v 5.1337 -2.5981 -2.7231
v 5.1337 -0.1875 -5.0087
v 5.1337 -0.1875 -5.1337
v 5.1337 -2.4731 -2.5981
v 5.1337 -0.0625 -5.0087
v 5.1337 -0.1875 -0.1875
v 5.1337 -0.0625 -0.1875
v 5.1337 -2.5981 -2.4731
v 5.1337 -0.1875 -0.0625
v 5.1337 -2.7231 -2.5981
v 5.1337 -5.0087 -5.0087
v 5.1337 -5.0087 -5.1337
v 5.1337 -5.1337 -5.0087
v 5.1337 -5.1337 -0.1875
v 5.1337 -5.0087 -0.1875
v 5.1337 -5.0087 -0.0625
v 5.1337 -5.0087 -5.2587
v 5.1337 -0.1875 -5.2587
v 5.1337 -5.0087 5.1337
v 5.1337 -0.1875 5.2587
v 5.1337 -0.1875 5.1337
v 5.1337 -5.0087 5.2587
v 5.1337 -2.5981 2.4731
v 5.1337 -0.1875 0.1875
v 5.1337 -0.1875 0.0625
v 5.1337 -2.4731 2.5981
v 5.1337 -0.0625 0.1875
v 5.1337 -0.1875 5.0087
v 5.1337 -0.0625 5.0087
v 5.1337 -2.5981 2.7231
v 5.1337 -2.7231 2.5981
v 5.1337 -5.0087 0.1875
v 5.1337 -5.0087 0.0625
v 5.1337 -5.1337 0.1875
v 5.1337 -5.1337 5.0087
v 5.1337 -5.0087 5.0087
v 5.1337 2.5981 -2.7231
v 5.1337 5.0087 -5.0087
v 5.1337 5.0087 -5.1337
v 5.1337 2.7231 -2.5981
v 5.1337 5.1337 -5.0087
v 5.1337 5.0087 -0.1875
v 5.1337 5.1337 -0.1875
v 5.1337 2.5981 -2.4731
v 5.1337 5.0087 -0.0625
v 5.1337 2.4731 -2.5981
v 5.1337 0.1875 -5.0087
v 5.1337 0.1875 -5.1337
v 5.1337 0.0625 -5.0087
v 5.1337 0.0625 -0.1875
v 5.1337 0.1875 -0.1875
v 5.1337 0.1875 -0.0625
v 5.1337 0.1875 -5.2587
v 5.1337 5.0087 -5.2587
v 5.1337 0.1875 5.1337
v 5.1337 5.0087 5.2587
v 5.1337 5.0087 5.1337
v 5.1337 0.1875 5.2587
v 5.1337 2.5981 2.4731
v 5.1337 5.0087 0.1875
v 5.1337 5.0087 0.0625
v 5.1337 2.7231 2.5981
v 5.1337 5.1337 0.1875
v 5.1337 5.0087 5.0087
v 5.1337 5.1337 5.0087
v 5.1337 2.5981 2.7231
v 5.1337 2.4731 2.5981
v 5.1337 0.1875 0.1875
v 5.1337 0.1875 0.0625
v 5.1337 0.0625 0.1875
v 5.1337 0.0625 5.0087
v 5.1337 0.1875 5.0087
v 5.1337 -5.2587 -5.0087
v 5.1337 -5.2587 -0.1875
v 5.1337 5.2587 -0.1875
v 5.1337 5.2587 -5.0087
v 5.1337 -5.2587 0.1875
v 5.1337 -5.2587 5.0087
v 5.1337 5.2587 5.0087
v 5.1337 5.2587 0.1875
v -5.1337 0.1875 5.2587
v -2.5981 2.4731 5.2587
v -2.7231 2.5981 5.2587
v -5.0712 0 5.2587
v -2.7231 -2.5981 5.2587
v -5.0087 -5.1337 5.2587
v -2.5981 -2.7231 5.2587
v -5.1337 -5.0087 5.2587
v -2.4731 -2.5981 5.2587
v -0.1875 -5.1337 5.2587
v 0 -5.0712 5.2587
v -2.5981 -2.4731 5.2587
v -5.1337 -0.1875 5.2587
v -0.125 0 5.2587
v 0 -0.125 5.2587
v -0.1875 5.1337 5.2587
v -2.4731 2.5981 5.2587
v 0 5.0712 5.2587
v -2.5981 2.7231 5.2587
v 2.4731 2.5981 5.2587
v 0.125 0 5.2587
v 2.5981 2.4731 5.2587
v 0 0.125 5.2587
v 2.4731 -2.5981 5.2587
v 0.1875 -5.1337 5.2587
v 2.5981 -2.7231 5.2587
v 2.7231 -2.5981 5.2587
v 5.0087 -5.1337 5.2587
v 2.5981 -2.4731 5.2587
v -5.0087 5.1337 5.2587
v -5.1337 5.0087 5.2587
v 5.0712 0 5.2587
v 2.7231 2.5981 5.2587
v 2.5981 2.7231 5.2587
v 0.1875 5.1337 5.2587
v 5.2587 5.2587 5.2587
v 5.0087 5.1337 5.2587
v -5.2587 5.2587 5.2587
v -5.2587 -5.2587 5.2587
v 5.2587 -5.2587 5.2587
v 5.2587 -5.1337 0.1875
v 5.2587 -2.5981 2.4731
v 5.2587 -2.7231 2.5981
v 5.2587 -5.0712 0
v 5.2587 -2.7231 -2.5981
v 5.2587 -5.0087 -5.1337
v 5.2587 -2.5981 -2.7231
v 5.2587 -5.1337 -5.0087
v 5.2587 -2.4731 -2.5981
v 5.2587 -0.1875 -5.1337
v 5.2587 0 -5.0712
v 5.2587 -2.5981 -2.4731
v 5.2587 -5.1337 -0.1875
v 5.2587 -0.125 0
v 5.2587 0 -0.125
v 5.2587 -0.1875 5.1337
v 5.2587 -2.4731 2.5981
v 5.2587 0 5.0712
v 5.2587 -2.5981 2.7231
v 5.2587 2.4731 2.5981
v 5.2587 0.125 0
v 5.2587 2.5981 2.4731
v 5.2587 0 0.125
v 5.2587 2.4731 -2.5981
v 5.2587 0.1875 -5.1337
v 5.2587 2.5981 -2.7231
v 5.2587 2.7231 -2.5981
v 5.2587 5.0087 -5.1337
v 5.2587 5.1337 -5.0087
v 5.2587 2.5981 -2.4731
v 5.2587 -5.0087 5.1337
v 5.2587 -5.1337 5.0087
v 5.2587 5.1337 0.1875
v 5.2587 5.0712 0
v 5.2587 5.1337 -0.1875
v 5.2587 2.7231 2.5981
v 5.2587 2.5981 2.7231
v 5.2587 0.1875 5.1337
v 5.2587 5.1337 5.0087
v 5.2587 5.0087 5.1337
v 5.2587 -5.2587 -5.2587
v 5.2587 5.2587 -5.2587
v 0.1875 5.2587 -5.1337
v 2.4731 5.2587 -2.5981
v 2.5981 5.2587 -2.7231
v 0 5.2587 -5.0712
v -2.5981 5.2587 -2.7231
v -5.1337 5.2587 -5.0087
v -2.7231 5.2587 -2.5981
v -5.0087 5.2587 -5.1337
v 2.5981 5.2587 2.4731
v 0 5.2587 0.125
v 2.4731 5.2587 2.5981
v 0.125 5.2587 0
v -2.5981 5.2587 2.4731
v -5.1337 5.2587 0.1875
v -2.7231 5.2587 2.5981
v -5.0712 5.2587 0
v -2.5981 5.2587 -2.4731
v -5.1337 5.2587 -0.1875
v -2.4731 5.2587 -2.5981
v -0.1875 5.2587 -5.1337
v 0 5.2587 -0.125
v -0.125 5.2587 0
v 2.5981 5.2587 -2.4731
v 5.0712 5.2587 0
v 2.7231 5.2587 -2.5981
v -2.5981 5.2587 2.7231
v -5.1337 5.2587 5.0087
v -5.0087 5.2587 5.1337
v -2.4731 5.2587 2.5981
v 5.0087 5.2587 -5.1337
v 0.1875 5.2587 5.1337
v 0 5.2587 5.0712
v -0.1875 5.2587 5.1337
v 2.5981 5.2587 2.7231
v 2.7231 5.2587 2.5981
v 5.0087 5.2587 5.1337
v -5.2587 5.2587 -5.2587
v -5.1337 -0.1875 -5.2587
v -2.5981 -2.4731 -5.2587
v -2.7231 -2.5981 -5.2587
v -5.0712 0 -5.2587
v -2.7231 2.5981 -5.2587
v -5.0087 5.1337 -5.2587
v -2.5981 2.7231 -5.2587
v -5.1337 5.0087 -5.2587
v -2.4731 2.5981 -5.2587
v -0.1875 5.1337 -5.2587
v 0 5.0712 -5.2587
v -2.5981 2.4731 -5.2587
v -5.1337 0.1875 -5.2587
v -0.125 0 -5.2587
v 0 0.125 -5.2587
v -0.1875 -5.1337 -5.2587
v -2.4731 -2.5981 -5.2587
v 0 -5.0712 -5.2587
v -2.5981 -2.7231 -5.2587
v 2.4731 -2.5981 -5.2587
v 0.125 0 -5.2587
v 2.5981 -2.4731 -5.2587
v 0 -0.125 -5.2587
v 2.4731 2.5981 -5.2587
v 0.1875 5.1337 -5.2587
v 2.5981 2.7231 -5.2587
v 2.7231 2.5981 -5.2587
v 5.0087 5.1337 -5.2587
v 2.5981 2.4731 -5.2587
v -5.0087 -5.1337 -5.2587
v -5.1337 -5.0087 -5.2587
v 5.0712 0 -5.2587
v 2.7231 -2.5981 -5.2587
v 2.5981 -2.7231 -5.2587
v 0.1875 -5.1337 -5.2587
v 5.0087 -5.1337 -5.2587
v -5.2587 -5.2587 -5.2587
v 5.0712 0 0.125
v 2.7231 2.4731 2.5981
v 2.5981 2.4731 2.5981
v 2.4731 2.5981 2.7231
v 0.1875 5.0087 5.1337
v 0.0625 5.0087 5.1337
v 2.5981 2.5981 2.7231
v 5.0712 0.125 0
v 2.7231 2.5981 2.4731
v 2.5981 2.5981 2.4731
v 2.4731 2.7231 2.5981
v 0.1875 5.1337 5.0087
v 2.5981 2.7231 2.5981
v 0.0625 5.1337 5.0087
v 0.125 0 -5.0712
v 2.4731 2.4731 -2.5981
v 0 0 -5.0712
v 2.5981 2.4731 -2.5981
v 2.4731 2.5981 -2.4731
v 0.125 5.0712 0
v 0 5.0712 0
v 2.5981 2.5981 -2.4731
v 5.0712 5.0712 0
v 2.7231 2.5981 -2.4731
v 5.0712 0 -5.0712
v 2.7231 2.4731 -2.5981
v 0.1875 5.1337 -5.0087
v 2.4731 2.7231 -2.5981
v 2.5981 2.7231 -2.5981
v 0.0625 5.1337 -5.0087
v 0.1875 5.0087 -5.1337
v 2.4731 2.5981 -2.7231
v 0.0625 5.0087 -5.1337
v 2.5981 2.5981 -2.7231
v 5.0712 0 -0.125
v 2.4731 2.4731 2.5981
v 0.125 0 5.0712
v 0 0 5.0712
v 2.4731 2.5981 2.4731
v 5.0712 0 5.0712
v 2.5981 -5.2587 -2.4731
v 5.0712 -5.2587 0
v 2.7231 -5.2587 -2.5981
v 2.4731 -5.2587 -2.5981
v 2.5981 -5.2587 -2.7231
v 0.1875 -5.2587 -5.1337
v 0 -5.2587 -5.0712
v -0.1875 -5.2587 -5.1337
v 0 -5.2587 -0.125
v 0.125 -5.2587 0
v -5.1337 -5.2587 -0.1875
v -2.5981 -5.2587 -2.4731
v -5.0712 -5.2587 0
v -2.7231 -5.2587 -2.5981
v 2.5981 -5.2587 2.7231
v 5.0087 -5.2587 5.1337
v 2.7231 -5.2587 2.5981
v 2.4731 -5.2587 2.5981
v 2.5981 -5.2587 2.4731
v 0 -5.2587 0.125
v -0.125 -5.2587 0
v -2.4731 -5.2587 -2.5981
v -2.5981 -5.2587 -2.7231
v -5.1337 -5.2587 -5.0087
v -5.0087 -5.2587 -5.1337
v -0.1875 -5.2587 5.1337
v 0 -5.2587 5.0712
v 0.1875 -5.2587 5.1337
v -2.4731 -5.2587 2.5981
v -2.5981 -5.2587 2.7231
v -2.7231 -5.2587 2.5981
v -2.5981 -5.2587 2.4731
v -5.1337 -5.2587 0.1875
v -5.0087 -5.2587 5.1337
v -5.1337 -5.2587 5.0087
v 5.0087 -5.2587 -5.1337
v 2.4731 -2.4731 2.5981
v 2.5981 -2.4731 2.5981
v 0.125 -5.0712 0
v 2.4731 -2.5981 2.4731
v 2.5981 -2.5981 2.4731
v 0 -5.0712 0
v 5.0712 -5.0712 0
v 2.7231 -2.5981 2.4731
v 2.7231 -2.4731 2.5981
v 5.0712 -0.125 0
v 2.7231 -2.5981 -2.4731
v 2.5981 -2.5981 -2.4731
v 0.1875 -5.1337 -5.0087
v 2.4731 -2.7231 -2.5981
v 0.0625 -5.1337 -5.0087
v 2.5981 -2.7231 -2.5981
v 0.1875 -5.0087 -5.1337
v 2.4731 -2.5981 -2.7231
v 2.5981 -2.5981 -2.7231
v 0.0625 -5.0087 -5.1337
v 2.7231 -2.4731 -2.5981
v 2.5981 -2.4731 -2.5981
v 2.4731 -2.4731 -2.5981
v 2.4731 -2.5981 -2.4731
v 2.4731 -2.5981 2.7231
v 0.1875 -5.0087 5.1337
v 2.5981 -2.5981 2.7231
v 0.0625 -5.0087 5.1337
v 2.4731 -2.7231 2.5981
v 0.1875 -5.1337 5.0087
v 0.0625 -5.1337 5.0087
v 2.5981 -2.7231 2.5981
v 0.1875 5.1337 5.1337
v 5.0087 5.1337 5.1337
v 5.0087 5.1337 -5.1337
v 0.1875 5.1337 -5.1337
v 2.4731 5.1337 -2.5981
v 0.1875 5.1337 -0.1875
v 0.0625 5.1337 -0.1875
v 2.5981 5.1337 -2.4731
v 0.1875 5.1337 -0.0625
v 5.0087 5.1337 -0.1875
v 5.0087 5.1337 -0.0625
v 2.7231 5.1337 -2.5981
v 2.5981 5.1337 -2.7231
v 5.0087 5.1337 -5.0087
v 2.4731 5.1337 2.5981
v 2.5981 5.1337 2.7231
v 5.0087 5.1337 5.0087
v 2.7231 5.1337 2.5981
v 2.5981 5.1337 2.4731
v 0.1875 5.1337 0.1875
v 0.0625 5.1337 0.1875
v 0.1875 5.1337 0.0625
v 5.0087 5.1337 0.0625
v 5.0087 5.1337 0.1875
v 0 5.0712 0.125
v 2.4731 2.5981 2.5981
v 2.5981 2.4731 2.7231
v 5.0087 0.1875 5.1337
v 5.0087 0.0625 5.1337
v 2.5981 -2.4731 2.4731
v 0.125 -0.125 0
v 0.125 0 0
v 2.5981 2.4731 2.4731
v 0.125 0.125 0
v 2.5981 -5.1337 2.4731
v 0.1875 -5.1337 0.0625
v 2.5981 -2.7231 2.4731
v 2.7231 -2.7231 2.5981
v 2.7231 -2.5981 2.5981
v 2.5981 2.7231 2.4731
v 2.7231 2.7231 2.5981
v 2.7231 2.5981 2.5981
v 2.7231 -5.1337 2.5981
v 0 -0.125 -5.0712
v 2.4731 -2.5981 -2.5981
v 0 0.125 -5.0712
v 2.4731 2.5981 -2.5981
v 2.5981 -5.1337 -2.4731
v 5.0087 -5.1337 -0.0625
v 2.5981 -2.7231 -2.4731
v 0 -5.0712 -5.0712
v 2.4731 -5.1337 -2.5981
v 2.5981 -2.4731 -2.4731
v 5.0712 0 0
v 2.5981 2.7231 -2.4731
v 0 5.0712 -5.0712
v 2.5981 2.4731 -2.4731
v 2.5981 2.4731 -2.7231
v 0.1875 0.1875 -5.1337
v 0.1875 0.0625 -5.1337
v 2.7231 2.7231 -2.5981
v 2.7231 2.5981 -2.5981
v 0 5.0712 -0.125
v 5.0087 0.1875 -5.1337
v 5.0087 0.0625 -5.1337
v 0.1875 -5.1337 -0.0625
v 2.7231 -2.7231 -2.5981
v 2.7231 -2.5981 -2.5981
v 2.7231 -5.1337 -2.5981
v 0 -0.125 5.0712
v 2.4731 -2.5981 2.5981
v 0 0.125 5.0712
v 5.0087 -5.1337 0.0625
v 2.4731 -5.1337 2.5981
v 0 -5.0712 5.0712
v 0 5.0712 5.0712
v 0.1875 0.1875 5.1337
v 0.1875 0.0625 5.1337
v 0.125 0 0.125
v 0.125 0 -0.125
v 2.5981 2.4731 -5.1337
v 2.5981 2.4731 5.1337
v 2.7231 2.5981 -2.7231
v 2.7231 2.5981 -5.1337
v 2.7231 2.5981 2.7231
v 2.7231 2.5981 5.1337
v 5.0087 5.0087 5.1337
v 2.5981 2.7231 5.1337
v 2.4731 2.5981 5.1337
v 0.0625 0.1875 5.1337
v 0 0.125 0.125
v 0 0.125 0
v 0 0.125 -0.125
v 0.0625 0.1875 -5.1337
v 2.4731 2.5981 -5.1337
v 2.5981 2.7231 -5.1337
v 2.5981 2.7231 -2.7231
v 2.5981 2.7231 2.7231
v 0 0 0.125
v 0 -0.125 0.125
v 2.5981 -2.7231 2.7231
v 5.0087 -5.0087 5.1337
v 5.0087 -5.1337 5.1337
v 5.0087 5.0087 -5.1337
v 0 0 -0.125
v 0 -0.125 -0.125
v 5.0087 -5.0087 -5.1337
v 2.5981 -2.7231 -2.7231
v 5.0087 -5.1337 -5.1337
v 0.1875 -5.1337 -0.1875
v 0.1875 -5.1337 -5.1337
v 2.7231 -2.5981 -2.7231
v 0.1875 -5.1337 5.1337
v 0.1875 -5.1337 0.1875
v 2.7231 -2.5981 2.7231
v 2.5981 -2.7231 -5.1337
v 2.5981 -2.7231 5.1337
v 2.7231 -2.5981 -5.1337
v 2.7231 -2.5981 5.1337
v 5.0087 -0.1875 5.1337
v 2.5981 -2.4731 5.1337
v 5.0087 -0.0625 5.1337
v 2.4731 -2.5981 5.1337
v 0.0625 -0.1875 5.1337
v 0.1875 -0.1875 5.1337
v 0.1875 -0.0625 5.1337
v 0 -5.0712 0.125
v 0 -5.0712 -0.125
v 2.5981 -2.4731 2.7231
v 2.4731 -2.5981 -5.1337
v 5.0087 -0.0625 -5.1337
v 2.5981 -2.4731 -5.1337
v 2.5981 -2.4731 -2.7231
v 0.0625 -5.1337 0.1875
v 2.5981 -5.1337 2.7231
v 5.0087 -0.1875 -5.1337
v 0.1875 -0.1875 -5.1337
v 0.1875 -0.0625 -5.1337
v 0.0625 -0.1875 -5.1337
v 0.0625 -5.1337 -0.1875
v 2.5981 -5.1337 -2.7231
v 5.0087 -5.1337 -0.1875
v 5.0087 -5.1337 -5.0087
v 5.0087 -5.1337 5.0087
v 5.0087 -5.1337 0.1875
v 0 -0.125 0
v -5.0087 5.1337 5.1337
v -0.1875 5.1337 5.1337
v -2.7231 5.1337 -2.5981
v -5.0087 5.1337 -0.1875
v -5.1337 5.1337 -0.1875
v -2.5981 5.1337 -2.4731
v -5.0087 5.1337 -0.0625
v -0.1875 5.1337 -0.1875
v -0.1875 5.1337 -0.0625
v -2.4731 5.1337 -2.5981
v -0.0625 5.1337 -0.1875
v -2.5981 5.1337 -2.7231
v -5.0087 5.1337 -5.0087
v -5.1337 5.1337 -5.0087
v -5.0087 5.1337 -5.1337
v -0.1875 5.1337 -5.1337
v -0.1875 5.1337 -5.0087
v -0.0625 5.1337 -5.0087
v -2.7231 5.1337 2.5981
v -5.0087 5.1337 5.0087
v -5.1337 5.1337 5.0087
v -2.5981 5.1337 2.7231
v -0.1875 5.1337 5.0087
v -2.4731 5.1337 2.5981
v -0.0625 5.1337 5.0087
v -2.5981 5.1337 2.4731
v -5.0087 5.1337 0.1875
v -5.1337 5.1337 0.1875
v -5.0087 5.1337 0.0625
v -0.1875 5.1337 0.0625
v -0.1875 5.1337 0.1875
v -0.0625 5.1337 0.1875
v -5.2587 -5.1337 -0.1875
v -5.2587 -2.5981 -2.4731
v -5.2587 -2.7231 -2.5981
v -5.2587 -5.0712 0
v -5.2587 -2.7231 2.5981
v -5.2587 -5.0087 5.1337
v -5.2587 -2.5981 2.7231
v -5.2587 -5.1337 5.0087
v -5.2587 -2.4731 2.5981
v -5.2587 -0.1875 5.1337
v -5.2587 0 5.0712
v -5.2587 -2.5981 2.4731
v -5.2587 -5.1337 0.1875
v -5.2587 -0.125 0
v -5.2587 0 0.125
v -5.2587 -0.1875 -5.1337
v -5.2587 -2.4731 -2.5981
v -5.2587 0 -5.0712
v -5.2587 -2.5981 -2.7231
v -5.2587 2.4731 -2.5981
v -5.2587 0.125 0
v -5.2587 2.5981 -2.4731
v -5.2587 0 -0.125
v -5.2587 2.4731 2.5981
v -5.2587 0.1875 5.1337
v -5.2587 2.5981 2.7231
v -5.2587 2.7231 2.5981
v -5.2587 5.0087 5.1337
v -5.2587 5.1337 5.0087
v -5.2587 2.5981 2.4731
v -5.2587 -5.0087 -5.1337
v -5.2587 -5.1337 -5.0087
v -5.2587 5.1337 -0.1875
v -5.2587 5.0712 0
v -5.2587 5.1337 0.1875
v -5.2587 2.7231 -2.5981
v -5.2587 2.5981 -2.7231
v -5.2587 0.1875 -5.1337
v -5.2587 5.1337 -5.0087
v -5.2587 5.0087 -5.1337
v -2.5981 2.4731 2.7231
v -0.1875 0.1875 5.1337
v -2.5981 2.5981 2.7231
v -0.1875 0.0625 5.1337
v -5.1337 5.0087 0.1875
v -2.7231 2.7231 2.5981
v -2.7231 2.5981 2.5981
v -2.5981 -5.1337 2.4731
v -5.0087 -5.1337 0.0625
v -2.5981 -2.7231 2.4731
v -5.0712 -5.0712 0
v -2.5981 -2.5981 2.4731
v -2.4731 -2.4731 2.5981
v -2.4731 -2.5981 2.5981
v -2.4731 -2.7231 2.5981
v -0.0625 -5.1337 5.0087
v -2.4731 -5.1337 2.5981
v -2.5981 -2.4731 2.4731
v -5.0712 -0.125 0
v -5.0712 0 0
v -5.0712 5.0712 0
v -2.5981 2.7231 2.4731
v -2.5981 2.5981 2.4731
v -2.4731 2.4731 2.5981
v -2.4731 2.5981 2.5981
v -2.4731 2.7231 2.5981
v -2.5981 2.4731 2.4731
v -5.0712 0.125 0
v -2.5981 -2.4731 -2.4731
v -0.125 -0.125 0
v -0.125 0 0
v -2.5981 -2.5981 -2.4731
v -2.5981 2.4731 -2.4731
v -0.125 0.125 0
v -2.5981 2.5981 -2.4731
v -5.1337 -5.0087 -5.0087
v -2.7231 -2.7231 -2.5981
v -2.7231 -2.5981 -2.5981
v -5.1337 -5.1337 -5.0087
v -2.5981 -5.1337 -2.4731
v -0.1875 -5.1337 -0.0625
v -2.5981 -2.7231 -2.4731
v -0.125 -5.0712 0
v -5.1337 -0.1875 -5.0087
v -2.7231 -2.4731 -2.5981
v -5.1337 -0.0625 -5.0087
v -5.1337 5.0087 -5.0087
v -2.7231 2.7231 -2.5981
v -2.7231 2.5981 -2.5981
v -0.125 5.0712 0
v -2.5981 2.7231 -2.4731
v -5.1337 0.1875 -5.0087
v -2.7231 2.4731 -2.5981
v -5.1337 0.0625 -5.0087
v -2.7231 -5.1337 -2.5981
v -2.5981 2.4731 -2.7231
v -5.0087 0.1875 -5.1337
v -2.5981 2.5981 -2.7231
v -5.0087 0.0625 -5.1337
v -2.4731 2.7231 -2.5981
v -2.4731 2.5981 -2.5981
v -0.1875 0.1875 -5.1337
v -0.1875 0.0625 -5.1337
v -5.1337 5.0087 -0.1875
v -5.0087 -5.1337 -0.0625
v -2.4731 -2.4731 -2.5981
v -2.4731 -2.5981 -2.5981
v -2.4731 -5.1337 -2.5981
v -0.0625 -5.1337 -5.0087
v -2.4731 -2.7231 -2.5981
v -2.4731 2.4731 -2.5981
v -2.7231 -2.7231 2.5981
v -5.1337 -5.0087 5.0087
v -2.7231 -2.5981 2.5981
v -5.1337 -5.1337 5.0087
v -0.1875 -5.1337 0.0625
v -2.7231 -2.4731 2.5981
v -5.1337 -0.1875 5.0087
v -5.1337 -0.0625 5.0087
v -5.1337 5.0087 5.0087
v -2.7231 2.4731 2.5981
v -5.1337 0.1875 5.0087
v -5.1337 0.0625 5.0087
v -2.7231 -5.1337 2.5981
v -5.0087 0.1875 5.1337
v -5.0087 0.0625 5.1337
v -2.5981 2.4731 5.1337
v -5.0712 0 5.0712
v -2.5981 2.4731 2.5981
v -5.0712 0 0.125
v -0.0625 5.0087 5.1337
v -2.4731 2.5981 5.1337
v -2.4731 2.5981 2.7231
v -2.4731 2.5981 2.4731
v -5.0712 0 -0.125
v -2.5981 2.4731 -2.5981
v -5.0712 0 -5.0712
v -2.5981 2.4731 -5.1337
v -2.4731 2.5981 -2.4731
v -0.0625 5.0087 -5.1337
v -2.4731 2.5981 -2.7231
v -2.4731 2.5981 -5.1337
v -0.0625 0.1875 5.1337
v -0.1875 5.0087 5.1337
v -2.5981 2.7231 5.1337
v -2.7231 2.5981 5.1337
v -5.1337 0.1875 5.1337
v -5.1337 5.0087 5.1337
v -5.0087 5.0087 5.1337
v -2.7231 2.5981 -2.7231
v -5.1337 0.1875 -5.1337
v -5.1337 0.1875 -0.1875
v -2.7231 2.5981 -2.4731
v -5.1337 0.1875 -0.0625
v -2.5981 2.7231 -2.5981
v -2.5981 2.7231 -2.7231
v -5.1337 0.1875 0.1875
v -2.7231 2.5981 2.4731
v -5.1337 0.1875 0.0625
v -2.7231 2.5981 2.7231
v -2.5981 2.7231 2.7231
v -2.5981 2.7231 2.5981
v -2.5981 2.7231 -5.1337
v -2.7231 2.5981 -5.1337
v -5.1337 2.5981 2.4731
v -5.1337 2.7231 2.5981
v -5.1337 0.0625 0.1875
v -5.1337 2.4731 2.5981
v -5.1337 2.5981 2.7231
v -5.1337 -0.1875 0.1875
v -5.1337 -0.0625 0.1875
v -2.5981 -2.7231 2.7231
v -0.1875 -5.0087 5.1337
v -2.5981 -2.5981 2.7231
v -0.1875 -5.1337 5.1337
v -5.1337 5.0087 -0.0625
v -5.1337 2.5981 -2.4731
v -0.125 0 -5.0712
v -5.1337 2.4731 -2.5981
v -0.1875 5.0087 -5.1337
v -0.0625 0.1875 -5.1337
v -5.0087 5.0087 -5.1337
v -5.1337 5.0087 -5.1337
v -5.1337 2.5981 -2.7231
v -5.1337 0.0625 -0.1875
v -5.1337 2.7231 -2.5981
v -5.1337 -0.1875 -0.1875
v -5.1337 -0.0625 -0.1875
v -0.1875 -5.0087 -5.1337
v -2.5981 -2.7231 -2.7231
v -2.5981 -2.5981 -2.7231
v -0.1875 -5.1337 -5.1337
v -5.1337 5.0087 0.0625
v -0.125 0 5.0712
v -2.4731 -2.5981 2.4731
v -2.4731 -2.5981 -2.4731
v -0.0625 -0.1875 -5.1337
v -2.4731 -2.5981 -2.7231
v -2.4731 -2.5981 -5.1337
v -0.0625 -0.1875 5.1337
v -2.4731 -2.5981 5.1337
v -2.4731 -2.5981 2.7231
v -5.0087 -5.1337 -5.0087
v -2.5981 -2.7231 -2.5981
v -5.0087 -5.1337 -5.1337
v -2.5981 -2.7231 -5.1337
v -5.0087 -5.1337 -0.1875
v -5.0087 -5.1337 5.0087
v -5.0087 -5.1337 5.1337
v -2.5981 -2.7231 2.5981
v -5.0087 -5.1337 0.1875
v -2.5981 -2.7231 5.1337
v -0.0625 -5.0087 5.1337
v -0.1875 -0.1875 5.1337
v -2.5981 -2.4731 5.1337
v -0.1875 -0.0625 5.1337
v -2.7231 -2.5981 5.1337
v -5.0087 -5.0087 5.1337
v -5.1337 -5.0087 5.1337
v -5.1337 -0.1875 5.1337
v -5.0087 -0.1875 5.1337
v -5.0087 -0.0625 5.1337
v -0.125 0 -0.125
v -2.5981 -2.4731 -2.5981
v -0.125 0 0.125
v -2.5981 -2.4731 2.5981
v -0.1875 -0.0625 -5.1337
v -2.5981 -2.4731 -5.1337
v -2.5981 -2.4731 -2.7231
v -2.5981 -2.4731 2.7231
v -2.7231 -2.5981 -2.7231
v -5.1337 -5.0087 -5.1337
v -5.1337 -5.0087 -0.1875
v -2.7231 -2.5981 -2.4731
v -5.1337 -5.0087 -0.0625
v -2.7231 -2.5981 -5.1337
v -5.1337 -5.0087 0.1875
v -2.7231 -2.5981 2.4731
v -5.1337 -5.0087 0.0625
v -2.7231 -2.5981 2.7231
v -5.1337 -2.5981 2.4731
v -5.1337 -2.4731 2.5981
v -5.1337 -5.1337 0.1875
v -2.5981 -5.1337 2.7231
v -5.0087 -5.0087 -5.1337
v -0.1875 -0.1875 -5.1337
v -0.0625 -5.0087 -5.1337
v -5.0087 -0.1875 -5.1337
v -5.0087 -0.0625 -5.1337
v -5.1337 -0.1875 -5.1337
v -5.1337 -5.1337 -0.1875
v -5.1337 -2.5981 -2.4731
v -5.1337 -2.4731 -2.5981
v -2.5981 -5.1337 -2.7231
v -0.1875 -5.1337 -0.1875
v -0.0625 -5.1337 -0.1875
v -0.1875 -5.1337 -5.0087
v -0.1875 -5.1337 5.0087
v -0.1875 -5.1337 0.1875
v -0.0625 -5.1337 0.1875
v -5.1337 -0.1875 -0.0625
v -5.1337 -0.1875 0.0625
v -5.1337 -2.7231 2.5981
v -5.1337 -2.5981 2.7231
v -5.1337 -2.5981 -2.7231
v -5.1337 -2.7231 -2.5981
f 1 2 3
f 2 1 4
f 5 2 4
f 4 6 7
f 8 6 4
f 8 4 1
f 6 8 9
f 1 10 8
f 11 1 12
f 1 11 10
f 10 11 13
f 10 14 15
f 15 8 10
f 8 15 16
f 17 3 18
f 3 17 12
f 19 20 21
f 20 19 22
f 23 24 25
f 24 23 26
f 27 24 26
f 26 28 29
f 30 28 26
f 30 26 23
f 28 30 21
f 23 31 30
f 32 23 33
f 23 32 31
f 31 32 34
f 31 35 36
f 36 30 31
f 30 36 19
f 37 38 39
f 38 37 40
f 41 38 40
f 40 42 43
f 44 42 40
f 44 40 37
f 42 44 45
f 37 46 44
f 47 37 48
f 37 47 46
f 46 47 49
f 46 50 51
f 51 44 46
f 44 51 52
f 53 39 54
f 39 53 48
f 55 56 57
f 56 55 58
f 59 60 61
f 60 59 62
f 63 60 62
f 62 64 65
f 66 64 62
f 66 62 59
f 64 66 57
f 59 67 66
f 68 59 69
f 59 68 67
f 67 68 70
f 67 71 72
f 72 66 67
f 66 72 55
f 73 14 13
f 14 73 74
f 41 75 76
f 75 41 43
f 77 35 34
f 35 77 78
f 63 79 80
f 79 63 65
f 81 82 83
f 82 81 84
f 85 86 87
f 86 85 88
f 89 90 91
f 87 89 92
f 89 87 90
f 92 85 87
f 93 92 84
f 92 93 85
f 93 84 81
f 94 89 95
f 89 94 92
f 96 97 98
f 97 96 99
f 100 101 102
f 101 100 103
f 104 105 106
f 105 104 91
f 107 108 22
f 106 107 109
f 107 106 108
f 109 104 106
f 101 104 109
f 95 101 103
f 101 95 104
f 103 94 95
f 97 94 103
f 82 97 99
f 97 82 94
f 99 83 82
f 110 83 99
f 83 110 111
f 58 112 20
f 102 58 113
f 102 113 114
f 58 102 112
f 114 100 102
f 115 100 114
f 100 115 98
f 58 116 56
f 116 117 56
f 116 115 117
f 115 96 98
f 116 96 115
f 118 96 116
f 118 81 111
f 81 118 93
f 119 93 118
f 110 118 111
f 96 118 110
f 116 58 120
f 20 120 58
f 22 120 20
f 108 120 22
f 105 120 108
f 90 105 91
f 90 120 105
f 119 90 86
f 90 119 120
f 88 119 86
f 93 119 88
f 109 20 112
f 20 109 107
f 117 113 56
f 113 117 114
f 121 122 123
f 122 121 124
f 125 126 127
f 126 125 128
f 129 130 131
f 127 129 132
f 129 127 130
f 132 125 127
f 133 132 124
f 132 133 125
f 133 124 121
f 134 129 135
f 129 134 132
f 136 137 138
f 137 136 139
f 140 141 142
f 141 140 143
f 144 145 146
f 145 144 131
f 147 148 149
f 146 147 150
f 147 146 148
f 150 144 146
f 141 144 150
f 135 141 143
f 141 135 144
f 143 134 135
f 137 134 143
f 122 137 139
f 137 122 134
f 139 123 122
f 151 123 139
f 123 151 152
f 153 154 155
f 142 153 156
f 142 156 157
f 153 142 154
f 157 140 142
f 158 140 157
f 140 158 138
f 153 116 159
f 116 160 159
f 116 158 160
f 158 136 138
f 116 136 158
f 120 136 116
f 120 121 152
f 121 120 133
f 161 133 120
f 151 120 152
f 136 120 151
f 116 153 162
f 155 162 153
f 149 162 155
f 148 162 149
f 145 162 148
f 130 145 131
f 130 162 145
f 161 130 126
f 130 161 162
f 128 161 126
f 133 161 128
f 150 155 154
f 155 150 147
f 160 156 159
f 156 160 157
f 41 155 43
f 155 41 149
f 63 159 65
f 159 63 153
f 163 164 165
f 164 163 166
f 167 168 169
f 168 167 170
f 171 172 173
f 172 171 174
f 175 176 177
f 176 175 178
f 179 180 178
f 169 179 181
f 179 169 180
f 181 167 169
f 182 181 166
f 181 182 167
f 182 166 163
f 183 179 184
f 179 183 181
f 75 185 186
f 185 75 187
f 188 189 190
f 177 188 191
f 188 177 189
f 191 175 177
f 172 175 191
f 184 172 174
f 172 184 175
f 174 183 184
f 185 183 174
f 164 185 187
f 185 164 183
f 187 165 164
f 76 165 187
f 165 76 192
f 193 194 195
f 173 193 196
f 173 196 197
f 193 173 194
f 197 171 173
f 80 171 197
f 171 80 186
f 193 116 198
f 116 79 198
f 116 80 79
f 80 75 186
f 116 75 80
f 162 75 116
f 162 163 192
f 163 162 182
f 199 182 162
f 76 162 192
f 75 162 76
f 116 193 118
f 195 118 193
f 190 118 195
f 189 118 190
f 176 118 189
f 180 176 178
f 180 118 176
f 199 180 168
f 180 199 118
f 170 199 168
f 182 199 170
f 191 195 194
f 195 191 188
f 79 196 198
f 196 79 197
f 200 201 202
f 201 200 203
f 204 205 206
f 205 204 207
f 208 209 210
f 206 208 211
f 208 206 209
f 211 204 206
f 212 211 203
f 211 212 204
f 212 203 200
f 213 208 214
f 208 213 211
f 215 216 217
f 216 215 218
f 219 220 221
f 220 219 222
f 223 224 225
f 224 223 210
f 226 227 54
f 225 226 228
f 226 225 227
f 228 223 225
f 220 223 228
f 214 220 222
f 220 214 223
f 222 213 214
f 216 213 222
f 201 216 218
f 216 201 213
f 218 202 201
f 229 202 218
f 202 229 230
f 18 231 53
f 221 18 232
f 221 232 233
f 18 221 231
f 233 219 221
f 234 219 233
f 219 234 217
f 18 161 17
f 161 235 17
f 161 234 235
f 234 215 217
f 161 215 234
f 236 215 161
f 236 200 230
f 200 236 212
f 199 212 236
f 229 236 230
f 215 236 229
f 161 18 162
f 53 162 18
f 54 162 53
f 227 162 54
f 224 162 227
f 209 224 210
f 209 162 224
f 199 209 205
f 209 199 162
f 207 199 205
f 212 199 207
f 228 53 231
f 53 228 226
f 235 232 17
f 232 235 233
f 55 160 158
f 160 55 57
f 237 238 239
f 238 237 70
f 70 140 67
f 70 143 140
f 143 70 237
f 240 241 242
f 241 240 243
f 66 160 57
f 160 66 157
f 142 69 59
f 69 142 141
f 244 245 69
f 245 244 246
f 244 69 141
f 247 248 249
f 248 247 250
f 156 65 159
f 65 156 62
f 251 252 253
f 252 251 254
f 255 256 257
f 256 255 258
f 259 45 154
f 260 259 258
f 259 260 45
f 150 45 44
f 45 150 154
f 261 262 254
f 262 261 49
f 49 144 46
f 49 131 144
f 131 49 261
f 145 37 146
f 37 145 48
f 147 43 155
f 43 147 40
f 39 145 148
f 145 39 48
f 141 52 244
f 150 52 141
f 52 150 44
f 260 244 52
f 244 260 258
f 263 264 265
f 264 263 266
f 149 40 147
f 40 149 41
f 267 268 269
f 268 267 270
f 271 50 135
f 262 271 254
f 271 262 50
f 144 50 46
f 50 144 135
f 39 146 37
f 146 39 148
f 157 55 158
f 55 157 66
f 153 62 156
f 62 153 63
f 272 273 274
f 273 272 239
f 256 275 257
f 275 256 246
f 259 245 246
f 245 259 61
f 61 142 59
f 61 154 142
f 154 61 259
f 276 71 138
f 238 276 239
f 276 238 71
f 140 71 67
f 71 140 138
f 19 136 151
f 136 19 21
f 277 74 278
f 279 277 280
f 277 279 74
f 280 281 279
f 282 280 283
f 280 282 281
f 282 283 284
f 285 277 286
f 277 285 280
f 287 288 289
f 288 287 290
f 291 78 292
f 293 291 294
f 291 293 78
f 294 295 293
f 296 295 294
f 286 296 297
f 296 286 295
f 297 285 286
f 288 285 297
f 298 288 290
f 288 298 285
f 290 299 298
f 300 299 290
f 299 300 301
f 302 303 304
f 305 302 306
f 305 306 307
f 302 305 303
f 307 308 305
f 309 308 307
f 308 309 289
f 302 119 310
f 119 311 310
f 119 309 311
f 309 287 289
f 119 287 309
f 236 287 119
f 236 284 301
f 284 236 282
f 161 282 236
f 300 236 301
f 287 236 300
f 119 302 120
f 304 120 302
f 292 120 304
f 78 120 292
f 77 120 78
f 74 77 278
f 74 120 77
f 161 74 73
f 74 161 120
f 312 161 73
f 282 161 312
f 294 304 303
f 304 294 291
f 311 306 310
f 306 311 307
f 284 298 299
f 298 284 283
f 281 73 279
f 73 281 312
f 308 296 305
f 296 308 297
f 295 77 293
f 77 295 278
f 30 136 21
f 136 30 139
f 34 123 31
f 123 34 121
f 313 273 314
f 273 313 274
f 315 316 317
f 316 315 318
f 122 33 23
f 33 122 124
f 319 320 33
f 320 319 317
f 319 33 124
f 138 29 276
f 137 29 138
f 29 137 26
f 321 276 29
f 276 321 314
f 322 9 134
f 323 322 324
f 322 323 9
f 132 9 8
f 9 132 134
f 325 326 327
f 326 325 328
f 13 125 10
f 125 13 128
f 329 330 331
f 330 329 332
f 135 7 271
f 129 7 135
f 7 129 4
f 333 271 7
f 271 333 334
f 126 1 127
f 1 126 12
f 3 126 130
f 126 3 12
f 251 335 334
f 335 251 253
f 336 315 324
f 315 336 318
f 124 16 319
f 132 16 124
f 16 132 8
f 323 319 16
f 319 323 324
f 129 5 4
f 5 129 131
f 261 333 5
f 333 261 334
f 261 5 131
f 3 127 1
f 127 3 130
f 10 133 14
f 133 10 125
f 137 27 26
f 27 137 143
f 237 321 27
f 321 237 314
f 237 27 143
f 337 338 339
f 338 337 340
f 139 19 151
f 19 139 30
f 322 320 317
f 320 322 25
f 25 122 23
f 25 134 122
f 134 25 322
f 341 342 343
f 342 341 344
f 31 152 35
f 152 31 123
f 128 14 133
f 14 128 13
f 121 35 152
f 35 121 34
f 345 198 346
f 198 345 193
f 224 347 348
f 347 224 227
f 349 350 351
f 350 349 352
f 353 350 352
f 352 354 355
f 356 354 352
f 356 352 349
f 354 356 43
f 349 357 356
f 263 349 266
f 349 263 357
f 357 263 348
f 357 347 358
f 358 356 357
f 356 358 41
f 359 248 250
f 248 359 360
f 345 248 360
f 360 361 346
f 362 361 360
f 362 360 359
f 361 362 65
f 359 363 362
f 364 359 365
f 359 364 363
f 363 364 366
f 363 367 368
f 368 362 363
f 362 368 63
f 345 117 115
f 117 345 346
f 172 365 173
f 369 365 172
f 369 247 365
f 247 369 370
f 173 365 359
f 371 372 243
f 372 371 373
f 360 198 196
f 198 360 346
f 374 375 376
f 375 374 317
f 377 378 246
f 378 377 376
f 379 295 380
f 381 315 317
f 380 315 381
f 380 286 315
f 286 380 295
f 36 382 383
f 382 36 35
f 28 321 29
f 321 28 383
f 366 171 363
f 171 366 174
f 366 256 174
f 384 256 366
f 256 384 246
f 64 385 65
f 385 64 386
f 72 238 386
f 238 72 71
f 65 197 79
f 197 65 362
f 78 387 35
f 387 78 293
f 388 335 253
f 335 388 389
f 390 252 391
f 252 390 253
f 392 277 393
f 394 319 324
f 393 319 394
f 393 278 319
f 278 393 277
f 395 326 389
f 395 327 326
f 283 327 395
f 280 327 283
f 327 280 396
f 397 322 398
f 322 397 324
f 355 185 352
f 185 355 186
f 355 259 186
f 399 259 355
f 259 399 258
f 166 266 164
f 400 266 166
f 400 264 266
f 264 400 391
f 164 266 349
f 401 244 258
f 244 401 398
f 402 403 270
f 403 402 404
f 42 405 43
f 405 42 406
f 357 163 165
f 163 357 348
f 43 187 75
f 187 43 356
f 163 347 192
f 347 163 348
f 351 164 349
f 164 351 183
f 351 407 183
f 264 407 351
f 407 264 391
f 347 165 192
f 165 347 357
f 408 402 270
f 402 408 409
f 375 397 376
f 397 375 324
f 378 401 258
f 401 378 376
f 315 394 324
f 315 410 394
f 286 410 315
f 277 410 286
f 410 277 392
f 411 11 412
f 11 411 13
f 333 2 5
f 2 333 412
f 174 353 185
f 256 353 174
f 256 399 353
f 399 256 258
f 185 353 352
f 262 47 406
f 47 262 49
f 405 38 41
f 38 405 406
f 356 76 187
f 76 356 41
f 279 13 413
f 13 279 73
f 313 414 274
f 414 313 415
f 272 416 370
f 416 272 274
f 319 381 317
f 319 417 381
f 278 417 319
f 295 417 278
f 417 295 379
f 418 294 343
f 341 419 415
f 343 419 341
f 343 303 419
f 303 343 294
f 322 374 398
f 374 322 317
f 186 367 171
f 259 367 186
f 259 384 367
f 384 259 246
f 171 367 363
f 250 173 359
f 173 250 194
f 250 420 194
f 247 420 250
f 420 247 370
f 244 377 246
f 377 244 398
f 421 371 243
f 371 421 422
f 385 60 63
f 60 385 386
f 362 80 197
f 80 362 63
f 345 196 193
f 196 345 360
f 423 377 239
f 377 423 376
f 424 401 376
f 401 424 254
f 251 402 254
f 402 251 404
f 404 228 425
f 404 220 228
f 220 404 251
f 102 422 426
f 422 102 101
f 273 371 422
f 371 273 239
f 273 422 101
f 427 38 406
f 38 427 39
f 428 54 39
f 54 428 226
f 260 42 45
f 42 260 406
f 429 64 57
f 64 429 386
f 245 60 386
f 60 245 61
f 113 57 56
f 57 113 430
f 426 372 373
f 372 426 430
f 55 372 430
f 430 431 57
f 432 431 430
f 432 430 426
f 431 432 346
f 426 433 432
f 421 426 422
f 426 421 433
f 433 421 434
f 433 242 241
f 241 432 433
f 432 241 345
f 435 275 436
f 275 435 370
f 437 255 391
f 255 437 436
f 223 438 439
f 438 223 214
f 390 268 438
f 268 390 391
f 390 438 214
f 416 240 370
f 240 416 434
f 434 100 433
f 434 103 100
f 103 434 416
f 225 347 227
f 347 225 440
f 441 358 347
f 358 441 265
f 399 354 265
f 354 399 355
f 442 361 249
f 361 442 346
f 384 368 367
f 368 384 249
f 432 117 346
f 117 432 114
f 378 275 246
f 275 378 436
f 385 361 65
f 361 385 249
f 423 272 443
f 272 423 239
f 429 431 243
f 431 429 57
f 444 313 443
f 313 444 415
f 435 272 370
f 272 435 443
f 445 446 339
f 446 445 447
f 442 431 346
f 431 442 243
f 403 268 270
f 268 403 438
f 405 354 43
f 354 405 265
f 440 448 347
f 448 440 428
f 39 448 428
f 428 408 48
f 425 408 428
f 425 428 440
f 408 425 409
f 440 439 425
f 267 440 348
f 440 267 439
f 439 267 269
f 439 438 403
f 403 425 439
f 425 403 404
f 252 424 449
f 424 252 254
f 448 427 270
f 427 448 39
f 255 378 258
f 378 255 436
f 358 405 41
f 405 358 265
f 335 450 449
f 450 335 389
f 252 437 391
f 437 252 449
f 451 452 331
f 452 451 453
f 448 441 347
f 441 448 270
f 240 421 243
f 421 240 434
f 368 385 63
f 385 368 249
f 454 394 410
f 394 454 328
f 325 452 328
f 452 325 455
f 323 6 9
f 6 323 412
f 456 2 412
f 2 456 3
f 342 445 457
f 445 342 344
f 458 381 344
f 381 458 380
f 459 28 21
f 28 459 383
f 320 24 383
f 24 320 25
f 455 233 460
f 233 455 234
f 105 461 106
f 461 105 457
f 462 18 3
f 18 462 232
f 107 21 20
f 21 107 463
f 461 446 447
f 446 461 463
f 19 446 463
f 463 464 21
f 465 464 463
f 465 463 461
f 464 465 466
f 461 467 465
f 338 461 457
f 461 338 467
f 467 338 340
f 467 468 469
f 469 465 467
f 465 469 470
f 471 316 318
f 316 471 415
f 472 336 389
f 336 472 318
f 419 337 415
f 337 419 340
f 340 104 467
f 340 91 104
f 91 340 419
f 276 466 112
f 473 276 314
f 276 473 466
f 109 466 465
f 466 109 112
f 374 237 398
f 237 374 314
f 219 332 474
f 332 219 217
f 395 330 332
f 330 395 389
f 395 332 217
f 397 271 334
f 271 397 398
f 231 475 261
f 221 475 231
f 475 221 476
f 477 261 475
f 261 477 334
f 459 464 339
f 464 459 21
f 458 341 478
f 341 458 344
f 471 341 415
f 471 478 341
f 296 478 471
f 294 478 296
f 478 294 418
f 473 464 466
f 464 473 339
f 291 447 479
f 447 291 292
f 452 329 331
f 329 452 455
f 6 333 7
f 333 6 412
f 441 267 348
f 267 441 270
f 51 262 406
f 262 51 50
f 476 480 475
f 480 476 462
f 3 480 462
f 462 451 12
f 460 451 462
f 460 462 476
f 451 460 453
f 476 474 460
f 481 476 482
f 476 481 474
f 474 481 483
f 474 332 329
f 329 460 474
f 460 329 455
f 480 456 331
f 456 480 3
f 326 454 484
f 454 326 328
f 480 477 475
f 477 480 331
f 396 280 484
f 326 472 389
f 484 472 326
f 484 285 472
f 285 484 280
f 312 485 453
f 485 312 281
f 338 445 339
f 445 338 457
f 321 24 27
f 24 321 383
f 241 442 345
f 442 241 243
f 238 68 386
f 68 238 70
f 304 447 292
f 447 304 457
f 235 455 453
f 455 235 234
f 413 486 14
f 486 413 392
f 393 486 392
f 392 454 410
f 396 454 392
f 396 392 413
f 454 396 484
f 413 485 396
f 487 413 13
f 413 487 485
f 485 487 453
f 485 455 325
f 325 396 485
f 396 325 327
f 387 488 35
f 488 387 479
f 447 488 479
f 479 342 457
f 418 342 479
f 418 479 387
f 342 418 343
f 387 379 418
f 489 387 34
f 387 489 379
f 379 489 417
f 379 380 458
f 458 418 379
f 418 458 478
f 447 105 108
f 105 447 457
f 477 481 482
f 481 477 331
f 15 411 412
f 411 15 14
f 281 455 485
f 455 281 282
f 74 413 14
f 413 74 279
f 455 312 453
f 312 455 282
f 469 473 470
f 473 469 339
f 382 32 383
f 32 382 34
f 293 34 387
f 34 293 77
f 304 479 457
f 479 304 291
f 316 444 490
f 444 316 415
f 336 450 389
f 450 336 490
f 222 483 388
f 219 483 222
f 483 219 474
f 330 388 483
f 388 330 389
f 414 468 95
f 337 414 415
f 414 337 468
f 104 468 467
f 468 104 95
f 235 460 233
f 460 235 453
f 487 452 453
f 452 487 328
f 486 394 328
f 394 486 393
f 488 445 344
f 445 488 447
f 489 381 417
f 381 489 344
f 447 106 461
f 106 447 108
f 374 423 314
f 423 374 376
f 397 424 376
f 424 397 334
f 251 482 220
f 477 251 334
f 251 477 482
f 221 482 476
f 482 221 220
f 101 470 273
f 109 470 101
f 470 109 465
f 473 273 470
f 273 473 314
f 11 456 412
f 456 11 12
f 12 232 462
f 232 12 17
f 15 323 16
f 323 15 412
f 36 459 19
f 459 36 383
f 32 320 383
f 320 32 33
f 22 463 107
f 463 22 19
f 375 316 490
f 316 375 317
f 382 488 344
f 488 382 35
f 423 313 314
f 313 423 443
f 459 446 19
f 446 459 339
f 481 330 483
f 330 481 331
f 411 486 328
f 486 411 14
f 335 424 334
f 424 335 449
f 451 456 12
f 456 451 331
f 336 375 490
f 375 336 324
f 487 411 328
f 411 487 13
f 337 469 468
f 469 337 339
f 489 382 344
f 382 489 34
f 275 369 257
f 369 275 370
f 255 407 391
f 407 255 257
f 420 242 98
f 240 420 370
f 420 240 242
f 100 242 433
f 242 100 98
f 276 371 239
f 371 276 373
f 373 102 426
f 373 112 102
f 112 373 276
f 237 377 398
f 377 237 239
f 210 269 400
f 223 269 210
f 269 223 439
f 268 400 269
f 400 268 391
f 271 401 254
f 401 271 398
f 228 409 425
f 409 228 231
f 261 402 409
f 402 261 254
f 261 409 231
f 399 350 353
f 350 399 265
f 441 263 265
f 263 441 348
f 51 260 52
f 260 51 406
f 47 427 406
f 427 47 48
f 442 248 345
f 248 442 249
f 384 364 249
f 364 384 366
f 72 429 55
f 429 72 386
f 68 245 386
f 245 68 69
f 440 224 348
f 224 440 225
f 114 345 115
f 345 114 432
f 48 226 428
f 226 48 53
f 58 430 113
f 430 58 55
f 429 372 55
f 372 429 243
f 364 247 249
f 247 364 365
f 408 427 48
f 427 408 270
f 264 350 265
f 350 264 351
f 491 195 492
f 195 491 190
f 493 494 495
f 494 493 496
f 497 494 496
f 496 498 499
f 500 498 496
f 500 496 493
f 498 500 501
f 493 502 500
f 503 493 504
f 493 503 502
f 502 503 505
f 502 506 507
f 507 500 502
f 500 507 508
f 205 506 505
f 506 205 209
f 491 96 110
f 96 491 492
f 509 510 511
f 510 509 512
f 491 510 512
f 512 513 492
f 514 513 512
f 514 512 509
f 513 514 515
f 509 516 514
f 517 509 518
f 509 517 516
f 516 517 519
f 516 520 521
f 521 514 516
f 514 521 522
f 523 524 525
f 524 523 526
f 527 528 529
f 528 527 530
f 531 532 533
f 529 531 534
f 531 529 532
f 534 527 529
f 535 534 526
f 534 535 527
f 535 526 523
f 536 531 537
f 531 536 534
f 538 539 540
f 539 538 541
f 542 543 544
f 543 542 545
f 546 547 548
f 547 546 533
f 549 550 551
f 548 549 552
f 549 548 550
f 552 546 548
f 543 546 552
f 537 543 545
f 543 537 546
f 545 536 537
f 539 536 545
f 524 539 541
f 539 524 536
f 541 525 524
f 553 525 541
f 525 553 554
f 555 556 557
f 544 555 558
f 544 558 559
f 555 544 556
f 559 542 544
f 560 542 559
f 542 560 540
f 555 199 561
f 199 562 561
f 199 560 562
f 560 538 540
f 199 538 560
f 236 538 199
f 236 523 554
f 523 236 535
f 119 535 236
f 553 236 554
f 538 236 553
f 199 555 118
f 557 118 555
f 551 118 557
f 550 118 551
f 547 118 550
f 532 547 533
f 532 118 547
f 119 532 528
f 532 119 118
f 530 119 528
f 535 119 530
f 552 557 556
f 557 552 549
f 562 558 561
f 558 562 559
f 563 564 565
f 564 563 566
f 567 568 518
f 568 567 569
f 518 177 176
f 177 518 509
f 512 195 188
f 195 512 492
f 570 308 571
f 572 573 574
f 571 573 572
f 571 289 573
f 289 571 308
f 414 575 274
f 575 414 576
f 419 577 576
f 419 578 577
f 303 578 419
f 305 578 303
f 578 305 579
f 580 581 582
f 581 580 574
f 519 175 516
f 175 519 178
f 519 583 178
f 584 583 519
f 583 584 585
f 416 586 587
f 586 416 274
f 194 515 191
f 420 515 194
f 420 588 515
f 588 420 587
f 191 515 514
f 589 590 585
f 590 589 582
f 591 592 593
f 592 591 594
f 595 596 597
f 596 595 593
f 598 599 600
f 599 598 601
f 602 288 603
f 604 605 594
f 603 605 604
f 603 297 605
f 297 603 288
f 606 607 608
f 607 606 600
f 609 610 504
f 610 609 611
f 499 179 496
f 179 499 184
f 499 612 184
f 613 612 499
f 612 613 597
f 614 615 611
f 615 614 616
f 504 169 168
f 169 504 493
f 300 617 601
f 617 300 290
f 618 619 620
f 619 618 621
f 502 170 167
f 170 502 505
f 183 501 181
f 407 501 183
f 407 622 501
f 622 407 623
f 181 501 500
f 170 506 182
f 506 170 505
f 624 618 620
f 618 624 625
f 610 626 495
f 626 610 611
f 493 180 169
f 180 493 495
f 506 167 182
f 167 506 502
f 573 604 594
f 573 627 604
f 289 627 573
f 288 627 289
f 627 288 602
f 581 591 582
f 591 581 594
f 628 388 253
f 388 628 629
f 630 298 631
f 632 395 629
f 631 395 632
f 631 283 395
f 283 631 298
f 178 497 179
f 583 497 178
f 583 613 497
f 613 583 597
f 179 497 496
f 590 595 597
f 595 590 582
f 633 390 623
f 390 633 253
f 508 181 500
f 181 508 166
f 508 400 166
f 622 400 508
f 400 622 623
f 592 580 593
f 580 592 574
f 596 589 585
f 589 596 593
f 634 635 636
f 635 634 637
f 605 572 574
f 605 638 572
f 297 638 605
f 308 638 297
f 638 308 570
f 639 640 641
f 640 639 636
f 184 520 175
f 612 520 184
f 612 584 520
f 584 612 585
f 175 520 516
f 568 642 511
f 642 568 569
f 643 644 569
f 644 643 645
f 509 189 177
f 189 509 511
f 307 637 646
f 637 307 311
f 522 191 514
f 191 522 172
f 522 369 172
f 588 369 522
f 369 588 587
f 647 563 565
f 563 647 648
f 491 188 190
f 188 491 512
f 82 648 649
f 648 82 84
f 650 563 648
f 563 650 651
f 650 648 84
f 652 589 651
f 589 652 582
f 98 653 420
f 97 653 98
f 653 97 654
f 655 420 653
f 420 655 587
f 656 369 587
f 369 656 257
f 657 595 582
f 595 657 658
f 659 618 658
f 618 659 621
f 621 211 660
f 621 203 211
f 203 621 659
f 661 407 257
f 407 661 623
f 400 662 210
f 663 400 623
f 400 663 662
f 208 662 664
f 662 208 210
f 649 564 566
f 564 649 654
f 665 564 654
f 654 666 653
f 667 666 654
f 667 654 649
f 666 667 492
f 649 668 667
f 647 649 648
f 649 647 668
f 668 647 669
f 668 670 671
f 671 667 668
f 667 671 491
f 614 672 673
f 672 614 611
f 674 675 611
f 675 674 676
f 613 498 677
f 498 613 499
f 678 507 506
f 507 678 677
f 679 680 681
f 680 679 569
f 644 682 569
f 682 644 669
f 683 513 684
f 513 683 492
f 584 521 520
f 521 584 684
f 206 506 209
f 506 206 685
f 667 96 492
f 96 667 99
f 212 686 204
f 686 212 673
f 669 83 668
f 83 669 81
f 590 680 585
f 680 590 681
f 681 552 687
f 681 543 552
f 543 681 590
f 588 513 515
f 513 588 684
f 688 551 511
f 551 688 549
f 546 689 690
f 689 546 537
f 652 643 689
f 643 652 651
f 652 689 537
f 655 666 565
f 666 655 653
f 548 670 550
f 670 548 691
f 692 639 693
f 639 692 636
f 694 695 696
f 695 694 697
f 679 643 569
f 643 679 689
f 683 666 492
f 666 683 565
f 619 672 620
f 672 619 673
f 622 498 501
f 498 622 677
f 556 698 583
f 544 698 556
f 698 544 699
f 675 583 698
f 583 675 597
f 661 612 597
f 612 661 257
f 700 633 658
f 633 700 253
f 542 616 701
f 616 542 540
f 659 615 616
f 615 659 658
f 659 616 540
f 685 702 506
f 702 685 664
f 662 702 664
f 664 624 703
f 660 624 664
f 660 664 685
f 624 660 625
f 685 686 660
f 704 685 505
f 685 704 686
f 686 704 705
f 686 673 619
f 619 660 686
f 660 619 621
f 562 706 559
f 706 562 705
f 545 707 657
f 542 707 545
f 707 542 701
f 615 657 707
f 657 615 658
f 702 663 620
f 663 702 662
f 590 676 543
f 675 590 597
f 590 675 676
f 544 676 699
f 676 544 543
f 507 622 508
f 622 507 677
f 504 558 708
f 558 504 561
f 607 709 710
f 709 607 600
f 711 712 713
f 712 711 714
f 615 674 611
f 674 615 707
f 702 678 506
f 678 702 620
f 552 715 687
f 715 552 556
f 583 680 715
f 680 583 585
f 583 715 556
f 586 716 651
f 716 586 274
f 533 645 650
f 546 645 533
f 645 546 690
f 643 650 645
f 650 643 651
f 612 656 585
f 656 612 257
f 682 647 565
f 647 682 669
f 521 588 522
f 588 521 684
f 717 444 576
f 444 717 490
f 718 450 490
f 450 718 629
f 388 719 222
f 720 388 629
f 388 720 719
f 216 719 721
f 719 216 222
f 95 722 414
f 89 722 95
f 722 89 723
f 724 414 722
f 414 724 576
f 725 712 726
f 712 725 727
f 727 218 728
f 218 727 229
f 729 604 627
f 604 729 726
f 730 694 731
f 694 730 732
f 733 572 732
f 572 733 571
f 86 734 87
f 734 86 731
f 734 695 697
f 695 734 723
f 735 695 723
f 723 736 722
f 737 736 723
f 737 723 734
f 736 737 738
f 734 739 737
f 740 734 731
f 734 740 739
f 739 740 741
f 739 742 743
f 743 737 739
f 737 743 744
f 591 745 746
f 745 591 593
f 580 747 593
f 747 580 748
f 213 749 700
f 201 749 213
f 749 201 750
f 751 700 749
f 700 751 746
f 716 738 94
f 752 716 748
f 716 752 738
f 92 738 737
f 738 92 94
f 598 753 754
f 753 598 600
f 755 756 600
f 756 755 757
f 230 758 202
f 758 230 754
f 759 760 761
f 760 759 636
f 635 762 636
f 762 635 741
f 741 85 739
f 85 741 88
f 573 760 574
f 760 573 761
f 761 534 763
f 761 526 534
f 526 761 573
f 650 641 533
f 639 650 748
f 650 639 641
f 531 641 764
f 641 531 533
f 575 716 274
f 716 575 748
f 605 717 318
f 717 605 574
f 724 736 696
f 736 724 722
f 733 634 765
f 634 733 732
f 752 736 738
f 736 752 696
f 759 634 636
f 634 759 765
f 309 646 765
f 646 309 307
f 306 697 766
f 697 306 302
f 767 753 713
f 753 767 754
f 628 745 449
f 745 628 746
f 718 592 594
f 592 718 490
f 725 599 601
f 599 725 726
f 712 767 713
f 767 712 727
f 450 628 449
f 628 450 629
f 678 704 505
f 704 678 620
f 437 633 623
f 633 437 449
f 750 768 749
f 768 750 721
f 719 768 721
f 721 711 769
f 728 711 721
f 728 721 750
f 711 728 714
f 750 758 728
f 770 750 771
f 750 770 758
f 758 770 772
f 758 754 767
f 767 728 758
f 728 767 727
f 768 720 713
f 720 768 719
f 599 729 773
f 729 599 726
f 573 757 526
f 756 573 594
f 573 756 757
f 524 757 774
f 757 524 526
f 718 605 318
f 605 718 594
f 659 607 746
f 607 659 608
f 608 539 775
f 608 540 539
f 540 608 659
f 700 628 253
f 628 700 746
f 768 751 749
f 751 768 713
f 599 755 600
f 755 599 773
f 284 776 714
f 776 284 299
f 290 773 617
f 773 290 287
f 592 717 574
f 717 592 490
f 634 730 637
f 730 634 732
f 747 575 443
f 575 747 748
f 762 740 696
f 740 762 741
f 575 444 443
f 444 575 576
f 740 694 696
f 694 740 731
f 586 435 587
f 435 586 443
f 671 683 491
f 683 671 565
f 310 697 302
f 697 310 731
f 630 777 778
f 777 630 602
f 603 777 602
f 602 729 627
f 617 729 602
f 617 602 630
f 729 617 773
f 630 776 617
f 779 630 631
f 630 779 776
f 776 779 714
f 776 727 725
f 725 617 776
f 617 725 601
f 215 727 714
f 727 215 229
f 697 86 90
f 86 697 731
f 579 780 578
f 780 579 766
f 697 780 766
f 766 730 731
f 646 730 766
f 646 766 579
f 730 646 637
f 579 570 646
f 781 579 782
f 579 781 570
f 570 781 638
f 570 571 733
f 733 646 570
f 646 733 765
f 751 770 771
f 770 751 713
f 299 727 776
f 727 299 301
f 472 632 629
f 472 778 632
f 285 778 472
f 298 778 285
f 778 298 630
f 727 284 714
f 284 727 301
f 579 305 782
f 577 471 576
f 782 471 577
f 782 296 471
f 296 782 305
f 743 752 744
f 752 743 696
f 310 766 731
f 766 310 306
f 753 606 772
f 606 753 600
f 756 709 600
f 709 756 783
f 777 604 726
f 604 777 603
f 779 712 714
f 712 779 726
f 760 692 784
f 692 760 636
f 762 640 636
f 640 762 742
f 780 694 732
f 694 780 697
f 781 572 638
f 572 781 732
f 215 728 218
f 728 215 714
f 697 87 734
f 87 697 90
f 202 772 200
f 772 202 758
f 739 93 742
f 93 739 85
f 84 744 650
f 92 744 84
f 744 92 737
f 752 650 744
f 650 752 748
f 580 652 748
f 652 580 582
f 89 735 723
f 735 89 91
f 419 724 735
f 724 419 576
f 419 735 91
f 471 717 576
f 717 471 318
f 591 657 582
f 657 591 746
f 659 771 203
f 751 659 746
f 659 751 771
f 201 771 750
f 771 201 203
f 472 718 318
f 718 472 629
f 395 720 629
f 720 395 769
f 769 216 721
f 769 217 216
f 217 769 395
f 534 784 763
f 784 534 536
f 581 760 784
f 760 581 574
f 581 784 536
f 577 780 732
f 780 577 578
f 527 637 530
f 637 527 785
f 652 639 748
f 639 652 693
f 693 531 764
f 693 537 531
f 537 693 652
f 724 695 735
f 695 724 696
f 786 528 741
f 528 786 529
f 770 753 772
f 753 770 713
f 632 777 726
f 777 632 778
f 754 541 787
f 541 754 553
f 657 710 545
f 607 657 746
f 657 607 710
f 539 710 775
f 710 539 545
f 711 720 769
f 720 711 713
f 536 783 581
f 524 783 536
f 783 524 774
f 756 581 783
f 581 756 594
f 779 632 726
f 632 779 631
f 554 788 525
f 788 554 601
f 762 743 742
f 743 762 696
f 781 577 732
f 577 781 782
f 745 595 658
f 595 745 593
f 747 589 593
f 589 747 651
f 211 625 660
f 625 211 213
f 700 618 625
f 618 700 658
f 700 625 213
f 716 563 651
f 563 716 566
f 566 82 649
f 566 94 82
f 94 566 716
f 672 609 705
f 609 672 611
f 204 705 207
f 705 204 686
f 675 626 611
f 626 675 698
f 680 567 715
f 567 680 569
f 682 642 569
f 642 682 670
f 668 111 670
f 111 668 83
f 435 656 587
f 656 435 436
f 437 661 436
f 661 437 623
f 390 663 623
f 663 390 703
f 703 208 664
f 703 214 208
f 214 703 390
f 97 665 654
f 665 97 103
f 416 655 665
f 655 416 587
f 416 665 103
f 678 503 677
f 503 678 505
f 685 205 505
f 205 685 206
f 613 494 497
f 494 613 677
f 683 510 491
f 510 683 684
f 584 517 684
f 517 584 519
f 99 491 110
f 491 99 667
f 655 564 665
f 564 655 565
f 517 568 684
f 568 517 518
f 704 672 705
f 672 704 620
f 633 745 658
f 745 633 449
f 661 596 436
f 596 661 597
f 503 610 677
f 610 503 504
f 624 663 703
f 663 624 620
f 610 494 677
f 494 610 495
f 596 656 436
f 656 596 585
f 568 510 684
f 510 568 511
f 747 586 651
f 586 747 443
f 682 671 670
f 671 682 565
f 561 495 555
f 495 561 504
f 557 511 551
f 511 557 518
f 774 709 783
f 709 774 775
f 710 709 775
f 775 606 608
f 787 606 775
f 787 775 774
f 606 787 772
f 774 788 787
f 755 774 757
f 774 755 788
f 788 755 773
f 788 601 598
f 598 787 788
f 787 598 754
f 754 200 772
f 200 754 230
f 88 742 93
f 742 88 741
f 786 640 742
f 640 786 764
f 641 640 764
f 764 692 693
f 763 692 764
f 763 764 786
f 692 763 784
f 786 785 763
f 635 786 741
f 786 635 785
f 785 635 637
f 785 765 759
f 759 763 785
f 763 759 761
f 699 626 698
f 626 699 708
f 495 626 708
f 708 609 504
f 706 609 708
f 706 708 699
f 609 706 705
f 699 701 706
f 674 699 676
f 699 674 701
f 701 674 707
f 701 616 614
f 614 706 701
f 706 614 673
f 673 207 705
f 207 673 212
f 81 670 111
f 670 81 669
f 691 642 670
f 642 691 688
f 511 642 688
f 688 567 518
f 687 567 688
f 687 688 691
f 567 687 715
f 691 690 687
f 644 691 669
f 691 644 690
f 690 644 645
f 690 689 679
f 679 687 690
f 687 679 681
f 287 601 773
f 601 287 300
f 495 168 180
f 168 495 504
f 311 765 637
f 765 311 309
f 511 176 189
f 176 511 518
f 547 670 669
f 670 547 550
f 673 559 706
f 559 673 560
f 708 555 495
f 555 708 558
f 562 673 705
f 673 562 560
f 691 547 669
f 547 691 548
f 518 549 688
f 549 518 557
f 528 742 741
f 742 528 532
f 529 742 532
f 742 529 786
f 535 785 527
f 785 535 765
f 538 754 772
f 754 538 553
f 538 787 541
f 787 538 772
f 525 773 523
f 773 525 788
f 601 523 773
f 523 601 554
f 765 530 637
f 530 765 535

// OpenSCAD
nbr=6;
taille=0.125;
union()
{
for (i=[1:nbr])
{
        union()
        {

    for (j=[1:nbr])
    {
        union()
        {
        for (k=[1:nbr])
        {
            hull()
            {
            translate([sin(360/nbr*i)*nbr,sin(360/nbr*j)*nbr,sin(360/nbr*k)*nbr])
            cube([taille,taille,taille],center=true);
            
            translate([sin(360/nbr*(i+1))*nbr,sin(360/nbr*(j+1))*nbr,sin(360/nbr*(k+1))*nbr])
            cube([taille,taille,taille],center=true);
            }
        }
    }   
    }    
}
}
}
